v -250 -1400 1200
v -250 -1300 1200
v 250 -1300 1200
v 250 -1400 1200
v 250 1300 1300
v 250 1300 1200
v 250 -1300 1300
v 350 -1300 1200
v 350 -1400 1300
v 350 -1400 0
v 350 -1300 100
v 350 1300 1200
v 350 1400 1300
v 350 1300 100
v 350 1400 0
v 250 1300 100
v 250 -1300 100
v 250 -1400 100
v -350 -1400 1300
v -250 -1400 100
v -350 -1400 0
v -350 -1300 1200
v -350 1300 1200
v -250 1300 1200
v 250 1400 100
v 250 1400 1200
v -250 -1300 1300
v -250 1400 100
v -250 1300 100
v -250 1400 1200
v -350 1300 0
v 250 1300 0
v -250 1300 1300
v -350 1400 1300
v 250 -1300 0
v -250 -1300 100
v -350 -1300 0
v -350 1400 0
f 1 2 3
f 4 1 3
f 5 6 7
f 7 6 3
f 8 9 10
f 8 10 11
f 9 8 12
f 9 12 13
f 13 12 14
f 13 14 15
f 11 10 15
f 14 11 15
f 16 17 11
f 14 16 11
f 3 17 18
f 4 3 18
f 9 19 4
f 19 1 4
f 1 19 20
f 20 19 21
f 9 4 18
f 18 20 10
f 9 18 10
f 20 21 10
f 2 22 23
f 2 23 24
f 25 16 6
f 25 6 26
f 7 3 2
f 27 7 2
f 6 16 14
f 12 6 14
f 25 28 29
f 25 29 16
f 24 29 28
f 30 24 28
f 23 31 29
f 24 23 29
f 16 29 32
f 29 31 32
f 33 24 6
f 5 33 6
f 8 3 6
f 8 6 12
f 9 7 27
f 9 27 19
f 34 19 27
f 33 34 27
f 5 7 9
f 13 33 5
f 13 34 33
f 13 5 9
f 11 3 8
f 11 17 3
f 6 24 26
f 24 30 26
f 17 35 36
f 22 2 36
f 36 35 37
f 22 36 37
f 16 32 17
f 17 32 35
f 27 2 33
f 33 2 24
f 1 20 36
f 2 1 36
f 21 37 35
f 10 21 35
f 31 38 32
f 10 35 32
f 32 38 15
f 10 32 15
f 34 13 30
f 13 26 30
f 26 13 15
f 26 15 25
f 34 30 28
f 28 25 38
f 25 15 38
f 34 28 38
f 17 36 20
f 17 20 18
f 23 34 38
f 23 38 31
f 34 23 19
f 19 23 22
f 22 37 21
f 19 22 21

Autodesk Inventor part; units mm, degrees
ref_plane "YZ Plane" through (0, 0, 0) normal (1, 0, 0) x (0, 1, 0)
ref_plane "XZ Plane" through (0, 0, 0) normal (0, 1, 0) x (-1, 0, 0)
ref_plane "XY Plane" through (0, 0, 0) normal (0, 0, 1) x (1, 0, 0)
sketch "スケッチ1" plane through (0, 0, 0) normal (0, 0, 1) x (1, 0, 0)
  line L0 (-300, 1350) -> (300, 1350) construction
  line L1 (300, 1350) -> (300, -1350) construction
  line L2 (300, -1350) -> (-300, -1350) construction
  line L3 (-300, -1350) -> (-300, 1350) construction
  line L4 (-300, 1350) -> (300, -1350) construction
  line L5 (300, 1350) -> (-300, -1350) construction
  line L6 (350, 1400) -> (-350, 1400)
  line L7 (-350, 1400) -> (-350, 1300)
  line L8 (-350, 1300) -> (-250, 1300)
  line L9 (250, 1300) -> (250, -1300)
  line L10 (250, -1300) -> (-250, -1300)
  line L11 (-350, -1300) -> (-350, -1400)
  line L12 (-350, -1400) -> (350, -1400)
  line L13 (350, -1400) -> (350, 1400)
  line L14 (350, 0) -> (-300, 0) construction
  line L15 (-350, 1300) -> (-350, -1300)
  line L16 (-250, -1400) -> (-250, -1300)
  line L17 (250, 1300) -> (250, 1400)
  line L18 (250, -1300) -> (250, -1400)
  line L19 (250, -1300) -> (350, -1300)
  line L20 (250, 1300) -> (350, 1300)
  line L21 (-250, 1300) -> (-250, 1350)
  line L22 (-250, -1300) -> (-250, 1300)
  line L23 (-250, 1350) -> (-250, 1400)
  line L24 (-250, 1300) -> (250, 1300)
  line L25 (-250, -1300) -> (-350, -1300)
  point P0 (0, 0)
  point P1 (0, 0)
  point P2 (0, 0)
  dimension "d2" = 100
  dimension "d3" = 100
  dimension "d5" = 100
  dimension "d12" = 600
  dimension "d13" = 2600
extrude "押し出し1" add sketch "スケッチ1" along normal blind 1300 contours L13 L20 L17 L6 | L17 L24 L21 L23 L6 | L13 L19 L9 L20 | L23 L21 L8 L7 L6 | L13 L12 L18 L19 | L18 L12 L16 L10 | L22 L25 L15 L8 | L16 L12 L11 L25
extrude "押し出し2" cut sketch "スケッチ1" along normal blind 1200 contours L17 L24 L21 L23 L6 | L13 L19 L9 L20 | L9 L10 L22 L24 | L18 L12 L16 L10 | L22 L25 L15 L8
extrude "押し出し3" add sketch "スケッチ1" along normal blind 100 contours L17 L24 L21 L23 L6 | L13 L19 L9 L20 | L18 L12 L16 L10
equation "\"d3\" = d2"
equation "\"d5\" = d2"
properties part number "Goal"
